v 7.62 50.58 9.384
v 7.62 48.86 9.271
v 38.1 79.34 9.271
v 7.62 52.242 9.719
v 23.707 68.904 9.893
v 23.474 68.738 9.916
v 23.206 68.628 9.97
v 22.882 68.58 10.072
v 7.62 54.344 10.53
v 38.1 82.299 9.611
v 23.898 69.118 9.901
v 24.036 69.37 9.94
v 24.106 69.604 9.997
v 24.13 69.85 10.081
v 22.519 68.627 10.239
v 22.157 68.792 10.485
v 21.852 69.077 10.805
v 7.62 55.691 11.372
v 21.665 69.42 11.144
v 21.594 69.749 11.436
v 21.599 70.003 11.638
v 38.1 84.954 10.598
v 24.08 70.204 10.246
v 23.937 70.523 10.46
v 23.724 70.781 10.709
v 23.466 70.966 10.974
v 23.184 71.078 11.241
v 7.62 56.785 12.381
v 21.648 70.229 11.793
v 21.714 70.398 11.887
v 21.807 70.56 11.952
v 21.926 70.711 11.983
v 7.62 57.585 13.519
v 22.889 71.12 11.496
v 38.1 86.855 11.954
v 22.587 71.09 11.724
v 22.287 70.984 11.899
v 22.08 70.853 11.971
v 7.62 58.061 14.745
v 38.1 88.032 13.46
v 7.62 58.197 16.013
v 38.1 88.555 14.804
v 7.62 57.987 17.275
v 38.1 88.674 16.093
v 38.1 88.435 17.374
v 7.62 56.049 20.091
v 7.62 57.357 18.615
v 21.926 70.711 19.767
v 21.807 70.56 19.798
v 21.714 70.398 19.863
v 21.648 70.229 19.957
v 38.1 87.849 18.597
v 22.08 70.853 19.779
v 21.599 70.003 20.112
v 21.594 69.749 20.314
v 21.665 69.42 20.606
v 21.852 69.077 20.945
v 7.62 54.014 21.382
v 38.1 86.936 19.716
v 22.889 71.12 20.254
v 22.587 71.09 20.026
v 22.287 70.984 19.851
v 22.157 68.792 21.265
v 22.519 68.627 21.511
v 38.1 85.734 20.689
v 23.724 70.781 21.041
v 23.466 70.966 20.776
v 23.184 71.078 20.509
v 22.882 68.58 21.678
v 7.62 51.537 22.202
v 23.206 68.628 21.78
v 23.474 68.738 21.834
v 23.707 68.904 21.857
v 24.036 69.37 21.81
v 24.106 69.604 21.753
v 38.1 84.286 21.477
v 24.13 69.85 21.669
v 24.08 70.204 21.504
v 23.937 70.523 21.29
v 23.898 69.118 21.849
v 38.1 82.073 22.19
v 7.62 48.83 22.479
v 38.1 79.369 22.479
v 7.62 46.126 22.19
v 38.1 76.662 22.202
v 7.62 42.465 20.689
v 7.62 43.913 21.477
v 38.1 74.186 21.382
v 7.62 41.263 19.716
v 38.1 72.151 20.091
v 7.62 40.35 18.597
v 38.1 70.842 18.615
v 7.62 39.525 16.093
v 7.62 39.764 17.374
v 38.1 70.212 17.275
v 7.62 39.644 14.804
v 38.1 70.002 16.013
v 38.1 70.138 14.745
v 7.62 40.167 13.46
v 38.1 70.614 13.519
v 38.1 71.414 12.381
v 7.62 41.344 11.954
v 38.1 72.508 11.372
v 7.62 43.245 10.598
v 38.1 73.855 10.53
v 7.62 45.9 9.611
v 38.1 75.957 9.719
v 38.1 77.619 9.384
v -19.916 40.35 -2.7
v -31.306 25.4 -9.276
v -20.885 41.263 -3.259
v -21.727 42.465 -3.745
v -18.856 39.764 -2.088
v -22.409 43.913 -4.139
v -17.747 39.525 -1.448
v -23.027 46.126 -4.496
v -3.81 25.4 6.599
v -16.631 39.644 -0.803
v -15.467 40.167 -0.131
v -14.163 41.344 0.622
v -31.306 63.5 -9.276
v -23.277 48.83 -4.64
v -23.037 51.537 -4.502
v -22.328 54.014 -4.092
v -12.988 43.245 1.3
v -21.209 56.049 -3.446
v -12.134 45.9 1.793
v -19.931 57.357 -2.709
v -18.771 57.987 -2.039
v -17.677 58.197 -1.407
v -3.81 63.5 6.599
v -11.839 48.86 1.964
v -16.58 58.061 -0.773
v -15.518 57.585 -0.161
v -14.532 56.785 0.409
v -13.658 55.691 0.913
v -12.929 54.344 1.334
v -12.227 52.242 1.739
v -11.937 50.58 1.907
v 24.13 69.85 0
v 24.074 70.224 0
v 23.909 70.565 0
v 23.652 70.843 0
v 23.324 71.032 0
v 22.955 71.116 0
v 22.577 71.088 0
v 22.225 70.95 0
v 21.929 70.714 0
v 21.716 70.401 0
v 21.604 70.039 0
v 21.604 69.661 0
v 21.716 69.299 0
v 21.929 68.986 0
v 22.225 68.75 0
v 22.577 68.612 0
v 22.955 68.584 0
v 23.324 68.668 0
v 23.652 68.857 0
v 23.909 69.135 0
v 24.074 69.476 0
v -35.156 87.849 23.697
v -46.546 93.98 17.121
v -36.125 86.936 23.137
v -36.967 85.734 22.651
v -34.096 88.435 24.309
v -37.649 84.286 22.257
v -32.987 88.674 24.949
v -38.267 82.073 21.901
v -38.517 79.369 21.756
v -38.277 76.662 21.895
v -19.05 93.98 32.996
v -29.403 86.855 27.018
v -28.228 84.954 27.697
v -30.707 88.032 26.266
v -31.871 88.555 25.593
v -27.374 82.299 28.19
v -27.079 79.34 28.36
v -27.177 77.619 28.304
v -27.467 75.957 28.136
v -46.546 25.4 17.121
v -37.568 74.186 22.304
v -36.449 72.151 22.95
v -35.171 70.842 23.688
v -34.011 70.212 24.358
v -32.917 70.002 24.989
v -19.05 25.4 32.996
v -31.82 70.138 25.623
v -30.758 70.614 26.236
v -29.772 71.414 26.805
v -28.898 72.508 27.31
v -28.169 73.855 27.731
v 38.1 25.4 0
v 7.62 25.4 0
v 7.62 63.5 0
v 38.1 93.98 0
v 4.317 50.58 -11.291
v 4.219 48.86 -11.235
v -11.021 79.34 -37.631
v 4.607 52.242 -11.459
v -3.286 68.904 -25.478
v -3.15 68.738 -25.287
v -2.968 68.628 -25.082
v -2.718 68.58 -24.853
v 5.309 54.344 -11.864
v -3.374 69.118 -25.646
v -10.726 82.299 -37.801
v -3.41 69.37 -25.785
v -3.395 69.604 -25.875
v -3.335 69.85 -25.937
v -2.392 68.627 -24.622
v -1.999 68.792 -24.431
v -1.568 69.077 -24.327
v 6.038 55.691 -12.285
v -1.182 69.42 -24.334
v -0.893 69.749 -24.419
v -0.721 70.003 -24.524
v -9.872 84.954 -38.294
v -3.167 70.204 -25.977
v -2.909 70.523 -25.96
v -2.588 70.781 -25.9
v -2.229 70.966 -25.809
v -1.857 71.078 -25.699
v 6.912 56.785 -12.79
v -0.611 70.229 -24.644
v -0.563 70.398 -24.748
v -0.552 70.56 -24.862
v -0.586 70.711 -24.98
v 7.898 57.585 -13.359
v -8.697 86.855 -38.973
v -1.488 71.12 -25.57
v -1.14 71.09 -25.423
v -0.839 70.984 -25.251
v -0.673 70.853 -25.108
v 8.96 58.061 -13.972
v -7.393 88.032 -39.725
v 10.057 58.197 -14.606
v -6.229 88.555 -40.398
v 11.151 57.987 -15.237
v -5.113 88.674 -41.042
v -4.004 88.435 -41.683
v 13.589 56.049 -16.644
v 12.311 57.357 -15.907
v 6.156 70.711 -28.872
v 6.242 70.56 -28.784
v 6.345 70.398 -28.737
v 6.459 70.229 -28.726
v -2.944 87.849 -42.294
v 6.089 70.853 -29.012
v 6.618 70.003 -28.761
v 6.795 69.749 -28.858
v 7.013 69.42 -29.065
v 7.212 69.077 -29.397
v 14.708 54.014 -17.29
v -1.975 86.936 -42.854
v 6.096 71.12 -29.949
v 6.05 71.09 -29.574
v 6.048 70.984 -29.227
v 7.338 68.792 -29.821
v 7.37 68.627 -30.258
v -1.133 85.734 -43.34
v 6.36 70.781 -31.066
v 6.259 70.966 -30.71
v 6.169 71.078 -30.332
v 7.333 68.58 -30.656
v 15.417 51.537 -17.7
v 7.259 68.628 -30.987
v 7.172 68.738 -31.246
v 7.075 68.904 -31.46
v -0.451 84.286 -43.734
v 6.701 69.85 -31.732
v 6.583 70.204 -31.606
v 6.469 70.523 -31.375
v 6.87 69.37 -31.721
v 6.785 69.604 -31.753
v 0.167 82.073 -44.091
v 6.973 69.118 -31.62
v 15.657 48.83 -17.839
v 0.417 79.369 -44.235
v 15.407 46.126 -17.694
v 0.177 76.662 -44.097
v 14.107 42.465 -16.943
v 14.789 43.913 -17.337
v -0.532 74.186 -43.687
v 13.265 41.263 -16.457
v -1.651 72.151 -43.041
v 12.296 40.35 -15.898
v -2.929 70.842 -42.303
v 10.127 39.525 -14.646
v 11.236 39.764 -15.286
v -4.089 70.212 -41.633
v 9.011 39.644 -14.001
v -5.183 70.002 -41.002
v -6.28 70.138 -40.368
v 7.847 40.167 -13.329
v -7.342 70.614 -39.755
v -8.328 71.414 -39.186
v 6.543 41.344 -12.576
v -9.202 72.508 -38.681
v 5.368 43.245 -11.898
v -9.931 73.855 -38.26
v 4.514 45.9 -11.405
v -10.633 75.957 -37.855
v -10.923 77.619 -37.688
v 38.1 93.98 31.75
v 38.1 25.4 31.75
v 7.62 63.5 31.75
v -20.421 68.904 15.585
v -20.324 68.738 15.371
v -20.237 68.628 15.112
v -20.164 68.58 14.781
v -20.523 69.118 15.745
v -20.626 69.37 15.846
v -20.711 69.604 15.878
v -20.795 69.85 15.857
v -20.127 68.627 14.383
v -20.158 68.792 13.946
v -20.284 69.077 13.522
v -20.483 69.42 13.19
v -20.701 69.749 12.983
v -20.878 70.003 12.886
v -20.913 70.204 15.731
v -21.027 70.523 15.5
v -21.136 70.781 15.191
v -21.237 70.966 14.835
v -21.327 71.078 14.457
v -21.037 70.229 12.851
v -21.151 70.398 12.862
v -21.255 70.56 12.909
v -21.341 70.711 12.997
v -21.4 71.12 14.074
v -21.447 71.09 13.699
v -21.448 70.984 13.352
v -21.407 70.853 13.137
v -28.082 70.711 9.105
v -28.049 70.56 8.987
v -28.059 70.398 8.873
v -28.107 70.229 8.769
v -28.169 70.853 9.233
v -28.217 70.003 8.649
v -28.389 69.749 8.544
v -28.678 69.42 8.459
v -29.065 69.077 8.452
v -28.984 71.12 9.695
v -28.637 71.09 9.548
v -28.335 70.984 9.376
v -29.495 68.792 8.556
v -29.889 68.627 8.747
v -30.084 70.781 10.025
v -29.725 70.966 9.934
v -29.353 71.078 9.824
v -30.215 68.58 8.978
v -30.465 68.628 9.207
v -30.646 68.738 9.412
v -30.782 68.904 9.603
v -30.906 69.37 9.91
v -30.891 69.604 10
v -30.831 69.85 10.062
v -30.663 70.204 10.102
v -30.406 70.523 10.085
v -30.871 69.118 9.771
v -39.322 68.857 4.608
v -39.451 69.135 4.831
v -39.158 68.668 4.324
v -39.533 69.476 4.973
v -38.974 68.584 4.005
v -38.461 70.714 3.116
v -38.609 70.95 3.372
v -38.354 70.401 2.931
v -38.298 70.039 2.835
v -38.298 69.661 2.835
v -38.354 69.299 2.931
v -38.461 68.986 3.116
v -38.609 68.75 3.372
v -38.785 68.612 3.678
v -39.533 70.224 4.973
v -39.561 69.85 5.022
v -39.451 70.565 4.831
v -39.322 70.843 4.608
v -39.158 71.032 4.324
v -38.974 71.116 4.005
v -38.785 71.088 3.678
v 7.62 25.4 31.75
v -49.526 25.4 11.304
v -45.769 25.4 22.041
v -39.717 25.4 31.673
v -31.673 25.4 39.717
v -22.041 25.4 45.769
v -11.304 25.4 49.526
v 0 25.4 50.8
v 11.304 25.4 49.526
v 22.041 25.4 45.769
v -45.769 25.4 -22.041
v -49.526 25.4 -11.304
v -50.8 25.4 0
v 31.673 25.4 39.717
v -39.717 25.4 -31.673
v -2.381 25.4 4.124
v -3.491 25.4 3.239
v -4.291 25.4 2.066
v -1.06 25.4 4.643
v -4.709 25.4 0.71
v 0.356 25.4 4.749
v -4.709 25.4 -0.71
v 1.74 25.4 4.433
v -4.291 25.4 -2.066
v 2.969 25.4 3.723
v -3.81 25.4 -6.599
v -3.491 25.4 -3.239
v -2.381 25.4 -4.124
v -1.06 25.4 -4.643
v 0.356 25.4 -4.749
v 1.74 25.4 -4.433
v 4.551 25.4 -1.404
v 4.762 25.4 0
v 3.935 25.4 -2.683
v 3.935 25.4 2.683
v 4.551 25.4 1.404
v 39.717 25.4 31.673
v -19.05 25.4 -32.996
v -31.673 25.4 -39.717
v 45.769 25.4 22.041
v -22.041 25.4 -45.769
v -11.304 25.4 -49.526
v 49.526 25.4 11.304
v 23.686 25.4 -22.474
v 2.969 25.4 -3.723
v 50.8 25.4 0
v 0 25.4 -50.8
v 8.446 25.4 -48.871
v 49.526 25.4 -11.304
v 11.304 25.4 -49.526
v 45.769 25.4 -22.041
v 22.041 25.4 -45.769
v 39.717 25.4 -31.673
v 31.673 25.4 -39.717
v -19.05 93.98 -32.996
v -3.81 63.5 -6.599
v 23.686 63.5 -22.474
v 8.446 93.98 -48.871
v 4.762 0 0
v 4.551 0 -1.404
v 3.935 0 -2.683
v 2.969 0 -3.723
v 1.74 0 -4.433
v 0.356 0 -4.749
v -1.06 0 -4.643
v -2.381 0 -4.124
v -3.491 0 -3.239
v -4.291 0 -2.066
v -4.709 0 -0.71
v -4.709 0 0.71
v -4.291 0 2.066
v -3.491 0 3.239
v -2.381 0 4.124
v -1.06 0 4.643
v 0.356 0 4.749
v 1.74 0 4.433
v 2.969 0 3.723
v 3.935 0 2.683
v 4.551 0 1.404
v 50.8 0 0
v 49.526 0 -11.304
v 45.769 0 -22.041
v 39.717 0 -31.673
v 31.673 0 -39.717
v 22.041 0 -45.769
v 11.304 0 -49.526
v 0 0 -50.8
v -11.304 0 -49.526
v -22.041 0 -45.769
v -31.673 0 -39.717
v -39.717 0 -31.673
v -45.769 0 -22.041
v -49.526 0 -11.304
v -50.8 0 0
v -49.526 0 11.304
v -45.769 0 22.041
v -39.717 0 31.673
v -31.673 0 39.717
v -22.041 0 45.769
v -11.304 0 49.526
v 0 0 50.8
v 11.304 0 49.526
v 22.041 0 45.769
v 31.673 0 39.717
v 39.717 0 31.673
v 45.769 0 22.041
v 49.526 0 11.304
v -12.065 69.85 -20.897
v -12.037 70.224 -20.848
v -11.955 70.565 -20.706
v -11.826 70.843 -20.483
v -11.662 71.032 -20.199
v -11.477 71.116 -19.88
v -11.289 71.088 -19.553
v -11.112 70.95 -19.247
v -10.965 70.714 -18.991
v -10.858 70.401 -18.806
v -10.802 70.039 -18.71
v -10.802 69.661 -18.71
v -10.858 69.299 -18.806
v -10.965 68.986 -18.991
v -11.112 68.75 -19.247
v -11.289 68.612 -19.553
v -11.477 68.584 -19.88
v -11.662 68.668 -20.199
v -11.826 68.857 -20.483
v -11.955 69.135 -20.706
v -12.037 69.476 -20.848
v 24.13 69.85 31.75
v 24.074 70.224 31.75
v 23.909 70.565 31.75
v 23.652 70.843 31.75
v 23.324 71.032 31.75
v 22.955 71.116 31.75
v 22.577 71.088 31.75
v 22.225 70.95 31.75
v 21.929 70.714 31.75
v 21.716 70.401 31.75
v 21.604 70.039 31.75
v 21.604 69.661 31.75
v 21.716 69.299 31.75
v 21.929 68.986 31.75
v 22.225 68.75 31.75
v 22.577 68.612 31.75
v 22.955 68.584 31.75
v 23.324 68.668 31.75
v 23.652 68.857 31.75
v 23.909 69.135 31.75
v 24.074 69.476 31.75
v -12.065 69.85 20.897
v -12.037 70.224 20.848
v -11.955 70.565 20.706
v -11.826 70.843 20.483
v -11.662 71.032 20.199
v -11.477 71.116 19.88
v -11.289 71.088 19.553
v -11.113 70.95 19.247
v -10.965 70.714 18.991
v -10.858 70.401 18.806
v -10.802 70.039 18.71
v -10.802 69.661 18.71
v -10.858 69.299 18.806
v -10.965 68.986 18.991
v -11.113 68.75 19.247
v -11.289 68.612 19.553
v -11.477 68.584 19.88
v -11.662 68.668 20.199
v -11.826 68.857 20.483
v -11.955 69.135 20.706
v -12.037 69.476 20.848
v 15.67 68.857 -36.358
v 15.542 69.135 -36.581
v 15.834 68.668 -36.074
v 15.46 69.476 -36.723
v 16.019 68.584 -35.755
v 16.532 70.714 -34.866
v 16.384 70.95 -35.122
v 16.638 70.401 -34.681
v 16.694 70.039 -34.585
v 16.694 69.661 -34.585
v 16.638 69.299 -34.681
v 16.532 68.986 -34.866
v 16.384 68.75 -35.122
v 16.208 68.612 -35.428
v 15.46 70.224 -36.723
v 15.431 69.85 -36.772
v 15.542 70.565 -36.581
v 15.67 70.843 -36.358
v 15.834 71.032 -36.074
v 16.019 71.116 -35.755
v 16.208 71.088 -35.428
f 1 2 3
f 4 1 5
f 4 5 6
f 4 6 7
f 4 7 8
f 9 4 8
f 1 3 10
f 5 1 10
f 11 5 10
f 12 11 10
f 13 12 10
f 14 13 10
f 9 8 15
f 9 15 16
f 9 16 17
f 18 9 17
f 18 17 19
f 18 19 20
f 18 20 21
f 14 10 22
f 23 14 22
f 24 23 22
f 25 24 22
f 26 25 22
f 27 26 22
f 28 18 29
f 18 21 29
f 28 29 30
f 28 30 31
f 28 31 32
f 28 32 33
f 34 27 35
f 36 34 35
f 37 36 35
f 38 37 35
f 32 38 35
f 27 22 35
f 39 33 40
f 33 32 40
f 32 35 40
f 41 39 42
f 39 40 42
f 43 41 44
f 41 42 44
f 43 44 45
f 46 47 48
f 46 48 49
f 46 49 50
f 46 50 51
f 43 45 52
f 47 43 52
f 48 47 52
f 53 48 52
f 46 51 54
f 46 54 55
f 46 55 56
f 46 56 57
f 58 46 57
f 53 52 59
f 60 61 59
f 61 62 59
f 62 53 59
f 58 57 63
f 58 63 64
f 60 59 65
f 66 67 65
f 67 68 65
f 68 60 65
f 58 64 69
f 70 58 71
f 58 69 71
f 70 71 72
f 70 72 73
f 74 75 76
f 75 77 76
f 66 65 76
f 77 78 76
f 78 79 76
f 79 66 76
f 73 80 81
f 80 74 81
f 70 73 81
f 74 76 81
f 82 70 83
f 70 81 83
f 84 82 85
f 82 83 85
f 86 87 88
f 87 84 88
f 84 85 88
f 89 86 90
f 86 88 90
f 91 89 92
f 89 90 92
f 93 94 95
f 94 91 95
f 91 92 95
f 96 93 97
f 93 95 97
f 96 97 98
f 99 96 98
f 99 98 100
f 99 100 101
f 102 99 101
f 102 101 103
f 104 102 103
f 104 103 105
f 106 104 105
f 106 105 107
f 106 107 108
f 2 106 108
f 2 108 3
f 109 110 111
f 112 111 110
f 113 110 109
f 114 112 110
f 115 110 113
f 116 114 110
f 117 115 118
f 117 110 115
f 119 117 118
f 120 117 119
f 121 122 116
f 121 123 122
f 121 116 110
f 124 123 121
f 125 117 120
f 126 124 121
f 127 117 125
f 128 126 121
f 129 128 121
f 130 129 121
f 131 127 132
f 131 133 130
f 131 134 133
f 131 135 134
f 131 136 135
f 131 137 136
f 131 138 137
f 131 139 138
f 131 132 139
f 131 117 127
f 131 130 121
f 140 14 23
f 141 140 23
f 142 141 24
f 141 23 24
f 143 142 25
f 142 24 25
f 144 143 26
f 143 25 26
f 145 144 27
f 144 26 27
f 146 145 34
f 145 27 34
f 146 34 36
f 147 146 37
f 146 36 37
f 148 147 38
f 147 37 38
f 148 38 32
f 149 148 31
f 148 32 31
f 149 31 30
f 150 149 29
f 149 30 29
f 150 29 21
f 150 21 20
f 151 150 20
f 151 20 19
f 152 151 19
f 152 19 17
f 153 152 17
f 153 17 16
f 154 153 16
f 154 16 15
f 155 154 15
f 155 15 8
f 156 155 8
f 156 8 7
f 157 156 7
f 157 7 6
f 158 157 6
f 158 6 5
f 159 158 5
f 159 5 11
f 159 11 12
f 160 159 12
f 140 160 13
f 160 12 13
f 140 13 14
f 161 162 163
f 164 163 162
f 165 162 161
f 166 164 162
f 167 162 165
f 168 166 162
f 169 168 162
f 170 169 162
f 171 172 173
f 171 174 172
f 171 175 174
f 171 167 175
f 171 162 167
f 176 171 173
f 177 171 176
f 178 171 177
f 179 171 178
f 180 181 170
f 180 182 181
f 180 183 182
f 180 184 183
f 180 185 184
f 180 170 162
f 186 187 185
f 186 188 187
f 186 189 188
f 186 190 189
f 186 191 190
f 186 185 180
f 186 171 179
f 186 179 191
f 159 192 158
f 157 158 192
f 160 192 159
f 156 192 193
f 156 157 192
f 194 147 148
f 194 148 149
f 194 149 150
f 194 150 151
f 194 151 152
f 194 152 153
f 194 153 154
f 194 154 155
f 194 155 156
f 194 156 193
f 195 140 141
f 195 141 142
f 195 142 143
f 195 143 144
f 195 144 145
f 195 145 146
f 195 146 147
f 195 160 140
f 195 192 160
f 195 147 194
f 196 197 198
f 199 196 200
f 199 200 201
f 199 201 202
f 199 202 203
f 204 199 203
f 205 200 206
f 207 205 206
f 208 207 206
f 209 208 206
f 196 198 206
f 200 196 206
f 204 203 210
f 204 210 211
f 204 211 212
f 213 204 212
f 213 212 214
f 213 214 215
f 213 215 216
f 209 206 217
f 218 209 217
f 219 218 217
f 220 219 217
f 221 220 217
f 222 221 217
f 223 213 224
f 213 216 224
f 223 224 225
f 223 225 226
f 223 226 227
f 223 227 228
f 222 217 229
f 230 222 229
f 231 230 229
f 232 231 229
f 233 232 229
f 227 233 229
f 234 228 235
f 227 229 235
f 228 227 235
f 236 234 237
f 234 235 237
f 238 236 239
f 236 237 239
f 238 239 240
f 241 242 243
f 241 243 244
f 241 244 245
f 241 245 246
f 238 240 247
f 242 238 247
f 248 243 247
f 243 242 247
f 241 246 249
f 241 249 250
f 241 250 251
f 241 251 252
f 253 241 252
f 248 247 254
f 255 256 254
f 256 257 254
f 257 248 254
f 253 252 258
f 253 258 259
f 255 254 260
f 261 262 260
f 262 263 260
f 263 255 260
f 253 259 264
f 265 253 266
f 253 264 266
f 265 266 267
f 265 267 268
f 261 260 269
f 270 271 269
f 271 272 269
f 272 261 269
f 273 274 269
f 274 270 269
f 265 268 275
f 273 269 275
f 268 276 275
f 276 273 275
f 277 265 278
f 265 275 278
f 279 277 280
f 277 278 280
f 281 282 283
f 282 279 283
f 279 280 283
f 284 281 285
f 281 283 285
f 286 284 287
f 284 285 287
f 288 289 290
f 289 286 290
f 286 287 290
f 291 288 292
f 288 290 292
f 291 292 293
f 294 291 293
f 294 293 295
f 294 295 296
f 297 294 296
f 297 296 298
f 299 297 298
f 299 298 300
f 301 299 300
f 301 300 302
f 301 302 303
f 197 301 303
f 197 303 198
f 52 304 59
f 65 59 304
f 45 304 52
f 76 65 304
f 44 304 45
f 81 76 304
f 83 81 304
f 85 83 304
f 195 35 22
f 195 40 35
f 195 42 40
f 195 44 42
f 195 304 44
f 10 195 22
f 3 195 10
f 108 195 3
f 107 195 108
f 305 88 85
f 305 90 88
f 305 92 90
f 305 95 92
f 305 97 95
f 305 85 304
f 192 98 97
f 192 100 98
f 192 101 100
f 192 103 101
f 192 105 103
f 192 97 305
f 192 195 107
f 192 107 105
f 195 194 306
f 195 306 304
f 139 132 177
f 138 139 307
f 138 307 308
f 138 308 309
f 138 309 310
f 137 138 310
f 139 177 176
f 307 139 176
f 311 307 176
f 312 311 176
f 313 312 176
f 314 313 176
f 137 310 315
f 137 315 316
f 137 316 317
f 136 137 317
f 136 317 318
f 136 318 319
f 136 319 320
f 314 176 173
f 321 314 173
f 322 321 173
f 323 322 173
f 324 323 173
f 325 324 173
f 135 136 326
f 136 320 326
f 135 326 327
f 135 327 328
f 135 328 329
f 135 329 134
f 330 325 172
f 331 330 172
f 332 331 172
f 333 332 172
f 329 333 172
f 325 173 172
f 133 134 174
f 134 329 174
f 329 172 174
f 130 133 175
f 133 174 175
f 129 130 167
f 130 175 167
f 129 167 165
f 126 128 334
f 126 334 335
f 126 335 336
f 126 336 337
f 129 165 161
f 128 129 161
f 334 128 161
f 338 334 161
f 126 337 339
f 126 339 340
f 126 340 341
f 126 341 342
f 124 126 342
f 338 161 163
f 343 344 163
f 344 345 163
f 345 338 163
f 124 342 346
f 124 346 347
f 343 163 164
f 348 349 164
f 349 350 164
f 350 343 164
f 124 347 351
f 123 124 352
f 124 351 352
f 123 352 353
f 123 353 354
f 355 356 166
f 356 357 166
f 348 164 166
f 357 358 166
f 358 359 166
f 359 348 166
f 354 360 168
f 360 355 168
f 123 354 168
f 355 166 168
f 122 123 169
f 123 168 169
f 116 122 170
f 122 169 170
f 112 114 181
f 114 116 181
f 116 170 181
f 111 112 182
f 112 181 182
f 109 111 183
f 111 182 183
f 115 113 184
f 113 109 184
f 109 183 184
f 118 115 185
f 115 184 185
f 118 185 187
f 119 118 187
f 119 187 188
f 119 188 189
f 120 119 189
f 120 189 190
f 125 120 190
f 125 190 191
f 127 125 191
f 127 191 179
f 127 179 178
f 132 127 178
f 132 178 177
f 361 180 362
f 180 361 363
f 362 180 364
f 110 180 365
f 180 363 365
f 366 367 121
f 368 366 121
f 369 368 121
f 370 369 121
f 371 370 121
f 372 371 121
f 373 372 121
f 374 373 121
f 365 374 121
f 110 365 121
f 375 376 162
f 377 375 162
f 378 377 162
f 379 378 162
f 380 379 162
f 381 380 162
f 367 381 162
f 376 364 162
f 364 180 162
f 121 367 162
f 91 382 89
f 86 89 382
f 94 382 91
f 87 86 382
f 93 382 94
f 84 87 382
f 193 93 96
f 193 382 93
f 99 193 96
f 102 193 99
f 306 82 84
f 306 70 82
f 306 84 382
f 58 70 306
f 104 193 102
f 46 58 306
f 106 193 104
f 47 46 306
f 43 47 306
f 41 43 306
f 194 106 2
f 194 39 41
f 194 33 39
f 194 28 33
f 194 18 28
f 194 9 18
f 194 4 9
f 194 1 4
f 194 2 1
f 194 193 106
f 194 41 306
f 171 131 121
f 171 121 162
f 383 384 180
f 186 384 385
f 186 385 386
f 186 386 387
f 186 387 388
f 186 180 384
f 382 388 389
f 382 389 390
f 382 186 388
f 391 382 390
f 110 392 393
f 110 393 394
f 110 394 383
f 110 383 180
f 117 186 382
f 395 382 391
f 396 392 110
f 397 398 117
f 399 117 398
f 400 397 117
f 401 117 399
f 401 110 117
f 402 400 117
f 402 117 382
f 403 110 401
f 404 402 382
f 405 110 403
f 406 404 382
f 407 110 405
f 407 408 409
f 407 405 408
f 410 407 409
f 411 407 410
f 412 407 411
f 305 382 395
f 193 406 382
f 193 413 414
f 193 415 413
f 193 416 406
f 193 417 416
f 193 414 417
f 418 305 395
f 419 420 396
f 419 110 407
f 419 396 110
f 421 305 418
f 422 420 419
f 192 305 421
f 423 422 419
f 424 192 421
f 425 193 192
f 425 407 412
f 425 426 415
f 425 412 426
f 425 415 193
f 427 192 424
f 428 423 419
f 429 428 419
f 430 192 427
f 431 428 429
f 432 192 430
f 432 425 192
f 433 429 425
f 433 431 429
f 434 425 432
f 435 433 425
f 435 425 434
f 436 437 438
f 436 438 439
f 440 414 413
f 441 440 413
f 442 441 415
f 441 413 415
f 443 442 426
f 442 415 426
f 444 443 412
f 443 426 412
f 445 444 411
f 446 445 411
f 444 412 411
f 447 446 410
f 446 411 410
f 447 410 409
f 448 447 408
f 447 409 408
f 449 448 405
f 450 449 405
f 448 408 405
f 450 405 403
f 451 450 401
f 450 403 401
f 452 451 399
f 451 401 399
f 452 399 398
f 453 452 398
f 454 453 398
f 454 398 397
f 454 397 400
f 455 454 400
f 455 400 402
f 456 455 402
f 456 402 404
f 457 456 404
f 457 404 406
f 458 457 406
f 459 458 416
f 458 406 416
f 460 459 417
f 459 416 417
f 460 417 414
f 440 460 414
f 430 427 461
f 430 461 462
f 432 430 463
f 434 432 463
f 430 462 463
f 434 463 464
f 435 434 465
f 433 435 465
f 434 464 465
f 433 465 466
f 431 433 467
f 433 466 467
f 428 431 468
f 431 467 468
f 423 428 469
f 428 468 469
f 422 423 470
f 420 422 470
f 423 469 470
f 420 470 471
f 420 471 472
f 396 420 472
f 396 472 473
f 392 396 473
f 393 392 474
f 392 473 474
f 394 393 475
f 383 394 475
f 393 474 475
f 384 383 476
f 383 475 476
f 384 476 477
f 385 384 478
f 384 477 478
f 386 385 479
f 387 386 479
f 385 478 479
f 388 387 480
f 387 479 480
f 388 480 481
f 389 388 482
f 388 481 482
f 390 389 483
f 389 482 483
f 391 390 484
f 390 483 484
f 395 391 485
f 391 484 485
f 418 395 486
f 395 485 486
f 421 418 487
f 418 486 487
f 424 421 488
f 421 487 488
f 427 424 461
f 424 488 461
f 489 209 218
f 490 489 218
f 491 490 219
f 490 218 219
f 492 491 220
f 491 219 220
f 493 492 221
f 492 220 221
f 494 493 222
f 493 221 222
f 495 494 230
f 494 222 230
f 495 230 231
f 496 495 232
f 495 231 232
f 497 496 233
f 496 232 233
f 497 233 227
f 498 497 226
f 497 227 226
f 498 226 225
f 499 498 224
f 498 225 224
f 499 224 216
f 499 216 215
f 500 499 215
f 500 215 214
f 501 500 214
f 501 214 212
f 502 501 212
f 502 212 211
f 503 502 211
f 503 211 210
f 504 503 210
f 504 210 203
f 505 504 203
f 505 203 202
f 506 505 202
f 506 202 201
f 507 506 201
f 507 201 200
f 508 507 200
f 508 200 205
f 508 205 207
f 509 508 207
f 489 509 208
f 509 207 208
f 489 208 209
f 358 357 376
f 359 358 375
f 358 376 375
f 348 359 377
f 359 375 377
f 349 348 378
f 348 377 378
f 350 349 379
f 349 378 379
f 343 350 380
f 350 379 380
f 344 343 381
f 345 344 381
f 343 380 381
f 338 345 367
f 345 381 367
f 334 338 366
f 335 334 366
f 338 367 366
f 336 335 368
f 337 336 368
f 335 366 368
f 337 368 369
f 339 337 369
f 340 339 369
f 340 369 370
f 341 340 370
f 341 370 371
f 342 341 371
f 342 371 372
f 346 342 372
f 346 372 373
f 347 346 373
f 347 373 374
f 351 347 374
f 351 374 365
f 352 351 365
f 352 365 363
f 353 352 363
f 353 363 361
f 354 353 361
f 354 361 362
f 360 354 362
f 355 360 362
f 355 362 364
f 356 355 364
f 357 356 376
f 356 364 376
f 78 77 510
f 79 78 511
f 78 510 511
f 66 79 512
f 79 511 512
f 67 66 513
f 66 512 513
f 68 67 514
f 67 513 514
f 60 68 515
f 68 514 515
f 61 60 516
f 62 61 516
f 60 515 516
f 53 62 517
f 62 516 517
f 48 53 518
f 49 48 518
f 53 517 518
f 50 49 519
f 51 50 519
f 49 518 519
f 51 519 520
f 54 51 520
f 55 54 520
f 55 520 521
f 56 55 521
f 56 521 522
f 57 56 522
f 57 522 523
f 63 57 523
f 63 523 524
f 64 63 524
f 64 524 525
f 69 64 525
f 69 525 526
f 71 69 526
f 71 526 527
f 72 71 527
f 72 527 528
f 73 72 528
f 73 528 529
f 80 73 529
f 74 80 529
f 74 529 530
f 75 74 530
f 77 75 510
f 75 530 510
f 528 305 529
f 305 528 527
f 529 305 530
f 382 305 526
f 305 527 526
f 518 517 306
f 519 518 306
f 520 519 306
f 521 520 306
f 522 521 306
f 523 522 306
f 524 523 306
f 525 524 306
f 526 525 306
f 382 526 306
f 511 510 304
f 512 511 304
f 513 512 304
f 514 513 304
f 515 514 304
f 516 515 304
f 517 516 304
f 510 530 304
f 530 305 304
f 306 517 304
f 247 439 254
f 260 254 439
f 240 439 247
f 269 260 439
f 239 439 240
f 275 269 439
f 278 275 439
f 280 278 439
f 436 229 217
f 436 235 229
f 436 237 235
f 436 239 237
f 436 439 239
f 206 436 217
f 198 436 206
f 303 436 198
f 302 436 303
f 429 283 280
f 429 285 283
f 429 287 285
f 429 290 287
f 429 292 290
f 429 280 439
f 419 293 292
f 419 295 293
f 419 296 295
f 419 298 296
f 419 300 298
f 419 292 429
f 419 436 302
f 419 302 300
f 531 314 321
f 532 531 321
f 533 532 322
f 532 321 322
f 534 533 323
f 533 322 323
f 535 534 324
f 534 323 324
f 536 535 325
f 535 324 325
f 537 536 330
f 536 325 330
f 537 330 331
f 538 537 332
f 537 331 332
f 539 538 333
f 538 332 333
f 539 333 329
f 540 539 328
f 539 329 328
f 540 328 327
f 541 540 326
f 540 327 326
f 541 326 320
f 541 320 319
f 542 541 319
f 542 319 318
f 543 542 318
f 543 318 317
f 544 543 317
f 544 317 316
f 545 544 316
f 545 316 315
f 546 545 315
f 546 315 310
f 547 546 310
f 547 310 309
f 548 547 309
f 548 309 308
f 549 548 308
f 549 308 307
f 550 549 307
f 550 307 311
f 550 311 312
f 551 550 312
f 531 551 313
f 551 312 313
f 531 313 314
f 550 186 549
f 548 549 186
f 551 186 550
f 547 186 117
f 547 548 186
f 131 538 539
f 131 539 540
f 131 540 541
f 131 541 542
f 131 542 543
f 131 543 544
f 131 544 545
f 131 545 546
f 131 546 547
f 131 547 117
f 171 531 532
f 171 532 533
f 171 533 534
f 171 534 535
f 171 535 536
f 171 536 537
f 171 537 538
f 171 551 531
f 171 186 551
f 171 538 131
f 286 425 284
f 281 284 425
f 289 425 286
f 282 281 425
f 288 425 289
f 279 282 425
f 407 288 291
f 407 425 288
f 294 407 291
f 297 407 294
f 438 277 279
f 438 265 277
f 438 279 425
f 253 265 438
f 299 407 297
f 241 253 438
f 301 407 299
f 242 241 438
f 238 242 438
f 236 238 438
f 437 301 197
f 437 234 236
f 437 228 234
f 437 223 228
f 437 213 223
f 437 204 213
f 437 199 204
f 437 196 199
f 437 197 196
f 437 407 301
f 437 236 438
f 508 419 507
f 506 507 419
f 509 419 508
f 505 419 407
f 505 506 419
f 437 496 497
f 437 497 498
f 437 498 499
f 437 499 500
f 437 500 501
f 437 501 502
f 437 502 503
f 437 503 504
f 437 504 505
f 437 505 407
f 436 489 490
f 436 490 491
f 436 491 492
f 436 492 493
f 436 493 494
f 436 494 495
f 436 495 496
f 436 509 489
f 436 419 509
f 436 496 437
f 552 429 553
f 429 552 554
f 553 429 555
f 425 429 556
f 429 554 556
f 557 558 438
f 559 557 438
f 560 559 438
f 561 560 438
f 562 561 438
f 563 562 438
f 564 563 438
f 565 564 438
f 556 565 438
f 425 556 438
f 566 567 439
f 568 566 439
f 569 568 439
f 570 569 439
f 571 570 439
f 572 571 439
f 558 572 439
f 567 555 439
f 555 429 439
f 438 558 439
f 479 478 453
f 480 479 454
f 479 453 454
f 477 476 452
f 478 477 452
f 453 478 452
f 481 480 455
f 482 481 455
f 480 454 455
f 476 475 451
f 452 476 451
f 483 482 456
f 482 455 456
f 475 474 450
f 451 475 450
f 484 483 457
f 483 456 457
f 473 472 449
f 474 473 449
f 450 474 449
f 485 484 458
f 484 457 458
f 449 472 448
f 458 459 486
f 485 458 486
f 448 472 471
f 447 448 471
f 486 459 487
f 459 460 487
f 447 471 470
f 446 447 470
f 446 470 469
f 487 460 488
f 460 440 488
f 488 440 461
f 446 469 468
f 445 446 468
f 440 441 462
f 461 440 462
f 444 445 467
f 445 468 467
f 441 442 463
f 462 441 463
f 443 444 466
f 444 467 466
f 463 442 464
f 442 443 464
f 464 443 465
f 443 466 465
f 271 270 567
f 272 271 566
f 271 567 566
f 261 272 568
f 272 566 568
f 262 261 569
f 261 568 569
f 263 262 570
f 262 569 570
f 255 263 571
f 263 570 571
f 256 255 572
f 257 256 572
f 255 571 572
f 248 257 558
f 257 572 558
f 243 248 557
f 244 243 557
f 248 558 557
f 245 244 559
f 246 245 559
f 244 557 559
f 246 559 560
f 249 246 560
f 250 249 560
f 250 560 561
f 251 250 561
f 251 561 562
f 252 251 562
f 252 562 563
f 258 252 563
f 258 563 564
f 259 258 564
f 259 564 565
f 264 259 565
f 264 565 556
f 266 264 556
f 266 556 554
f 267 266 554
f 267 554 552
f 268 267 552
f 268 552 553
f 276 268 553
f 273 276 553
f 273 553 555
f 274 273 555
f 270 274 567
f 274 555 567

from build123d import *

# Parameters (mm, degrees)
SKETCH1_R           = 50.8
BOSS_EXTRUDE1_DEPTH = 25.4
BOSS_EXTRUDE2_DEPTH = 31.75
SKETCH9_R           = 6.604
CUT_EXTRUDE2_DEPTH  = 68.58
SKETCH10_R          = 1.27
CUT_EXTRUDE3_DEPTH  = 68.58
CIRPATTERN3_COUNT   = 3
SKETCH11_R          = 4.7625
CUT_EXTRUDE4_DEPTH  = 25.4


with BuildPart() as part:
    # Sketch1 → Boss-Extrude1 (new body)
    with BuildSketch(Plane(origin=(0, 0, 0), x_dir=(1, 0, 0), z_dir=(0, 1, 0))):
        Circle(SKETCH1_R)
    extrude(amount=BOSS_EXTRUDE1_DEPTH)

    # Sketch4 → Boss-Extrude2 (add)
    with BuildSketch(Plane.XY):
        Polygon((7.62, 25.4), (7.62, 63.5), (38.1, 93.98), (38.1, 25.4), align=None)
    boss_extrude2 = extrude(amount=BOSS_EXTRUDE2_DEPTH)

    # Sketch9 → Cut-Extrude2 (cut)
    with BuildSketch(Plane(origin=(66.802, 66.802, 0), x_dir=(0, 0, -1), z_dir=(0.707106781, 0.707106781, 0))):
        with Locations((-15.875, 29.160757667)):
            Circle(SKETCH9_R)
    cut_extrude2 = extrude(amount=-CUT_EXTRUDE2_DEPTH, mode=Mode.SUBTRACT)

    # Sketch10 → Cut-Extrude3 (cut)
    with BuildSketch(Plane.XY.offset(31.75)):
        with Locations((22.86, 69.85)):
            Circle(SKETCH10_R)
    cut_extrude3 = extrude(amount=-CUT_EXTRUDE3_DEPTH, mode=Mode.SUBTRACT)

    # CirPattern3: Boss-Extrude2, Cut-Extrude2, Cut-Extrude3 ×3 about axis
    cirpattern3_axis = Axis((0, 0, 0), (0, 1, 0))
    for i in range(1, CIRPATTERN3_COUNT):
        add(boss_extrude2.rotate(cirpattern3_axis, i * 360 / CIRPATTERN3_COUNT))
        add(cut_extrude2.rotate(cirpattern3_axis, i * 360 / CIRPATTERN3_COUNT), mode=Mode.SUBTRACT)
        add(cut_extrude3.rotate(cirpattern3_axis, i * 360 / CIRPATTERN3_COUNT), mode=Mode.SUBTRACT)

    # Sketch11 → Cut-Extrude4 (cut)
    with BuildSketch(Plane(origin=(0, 25.4, 0), x_dir=(1, 0, 0), z_dir=(0, 1, 0))):
        Circle(SKETCH11_R)
    extrude(amount=-CUT_EXTRUDE4_DEPTH, mode=Mode.SUBTRACT)


solid = part.part
